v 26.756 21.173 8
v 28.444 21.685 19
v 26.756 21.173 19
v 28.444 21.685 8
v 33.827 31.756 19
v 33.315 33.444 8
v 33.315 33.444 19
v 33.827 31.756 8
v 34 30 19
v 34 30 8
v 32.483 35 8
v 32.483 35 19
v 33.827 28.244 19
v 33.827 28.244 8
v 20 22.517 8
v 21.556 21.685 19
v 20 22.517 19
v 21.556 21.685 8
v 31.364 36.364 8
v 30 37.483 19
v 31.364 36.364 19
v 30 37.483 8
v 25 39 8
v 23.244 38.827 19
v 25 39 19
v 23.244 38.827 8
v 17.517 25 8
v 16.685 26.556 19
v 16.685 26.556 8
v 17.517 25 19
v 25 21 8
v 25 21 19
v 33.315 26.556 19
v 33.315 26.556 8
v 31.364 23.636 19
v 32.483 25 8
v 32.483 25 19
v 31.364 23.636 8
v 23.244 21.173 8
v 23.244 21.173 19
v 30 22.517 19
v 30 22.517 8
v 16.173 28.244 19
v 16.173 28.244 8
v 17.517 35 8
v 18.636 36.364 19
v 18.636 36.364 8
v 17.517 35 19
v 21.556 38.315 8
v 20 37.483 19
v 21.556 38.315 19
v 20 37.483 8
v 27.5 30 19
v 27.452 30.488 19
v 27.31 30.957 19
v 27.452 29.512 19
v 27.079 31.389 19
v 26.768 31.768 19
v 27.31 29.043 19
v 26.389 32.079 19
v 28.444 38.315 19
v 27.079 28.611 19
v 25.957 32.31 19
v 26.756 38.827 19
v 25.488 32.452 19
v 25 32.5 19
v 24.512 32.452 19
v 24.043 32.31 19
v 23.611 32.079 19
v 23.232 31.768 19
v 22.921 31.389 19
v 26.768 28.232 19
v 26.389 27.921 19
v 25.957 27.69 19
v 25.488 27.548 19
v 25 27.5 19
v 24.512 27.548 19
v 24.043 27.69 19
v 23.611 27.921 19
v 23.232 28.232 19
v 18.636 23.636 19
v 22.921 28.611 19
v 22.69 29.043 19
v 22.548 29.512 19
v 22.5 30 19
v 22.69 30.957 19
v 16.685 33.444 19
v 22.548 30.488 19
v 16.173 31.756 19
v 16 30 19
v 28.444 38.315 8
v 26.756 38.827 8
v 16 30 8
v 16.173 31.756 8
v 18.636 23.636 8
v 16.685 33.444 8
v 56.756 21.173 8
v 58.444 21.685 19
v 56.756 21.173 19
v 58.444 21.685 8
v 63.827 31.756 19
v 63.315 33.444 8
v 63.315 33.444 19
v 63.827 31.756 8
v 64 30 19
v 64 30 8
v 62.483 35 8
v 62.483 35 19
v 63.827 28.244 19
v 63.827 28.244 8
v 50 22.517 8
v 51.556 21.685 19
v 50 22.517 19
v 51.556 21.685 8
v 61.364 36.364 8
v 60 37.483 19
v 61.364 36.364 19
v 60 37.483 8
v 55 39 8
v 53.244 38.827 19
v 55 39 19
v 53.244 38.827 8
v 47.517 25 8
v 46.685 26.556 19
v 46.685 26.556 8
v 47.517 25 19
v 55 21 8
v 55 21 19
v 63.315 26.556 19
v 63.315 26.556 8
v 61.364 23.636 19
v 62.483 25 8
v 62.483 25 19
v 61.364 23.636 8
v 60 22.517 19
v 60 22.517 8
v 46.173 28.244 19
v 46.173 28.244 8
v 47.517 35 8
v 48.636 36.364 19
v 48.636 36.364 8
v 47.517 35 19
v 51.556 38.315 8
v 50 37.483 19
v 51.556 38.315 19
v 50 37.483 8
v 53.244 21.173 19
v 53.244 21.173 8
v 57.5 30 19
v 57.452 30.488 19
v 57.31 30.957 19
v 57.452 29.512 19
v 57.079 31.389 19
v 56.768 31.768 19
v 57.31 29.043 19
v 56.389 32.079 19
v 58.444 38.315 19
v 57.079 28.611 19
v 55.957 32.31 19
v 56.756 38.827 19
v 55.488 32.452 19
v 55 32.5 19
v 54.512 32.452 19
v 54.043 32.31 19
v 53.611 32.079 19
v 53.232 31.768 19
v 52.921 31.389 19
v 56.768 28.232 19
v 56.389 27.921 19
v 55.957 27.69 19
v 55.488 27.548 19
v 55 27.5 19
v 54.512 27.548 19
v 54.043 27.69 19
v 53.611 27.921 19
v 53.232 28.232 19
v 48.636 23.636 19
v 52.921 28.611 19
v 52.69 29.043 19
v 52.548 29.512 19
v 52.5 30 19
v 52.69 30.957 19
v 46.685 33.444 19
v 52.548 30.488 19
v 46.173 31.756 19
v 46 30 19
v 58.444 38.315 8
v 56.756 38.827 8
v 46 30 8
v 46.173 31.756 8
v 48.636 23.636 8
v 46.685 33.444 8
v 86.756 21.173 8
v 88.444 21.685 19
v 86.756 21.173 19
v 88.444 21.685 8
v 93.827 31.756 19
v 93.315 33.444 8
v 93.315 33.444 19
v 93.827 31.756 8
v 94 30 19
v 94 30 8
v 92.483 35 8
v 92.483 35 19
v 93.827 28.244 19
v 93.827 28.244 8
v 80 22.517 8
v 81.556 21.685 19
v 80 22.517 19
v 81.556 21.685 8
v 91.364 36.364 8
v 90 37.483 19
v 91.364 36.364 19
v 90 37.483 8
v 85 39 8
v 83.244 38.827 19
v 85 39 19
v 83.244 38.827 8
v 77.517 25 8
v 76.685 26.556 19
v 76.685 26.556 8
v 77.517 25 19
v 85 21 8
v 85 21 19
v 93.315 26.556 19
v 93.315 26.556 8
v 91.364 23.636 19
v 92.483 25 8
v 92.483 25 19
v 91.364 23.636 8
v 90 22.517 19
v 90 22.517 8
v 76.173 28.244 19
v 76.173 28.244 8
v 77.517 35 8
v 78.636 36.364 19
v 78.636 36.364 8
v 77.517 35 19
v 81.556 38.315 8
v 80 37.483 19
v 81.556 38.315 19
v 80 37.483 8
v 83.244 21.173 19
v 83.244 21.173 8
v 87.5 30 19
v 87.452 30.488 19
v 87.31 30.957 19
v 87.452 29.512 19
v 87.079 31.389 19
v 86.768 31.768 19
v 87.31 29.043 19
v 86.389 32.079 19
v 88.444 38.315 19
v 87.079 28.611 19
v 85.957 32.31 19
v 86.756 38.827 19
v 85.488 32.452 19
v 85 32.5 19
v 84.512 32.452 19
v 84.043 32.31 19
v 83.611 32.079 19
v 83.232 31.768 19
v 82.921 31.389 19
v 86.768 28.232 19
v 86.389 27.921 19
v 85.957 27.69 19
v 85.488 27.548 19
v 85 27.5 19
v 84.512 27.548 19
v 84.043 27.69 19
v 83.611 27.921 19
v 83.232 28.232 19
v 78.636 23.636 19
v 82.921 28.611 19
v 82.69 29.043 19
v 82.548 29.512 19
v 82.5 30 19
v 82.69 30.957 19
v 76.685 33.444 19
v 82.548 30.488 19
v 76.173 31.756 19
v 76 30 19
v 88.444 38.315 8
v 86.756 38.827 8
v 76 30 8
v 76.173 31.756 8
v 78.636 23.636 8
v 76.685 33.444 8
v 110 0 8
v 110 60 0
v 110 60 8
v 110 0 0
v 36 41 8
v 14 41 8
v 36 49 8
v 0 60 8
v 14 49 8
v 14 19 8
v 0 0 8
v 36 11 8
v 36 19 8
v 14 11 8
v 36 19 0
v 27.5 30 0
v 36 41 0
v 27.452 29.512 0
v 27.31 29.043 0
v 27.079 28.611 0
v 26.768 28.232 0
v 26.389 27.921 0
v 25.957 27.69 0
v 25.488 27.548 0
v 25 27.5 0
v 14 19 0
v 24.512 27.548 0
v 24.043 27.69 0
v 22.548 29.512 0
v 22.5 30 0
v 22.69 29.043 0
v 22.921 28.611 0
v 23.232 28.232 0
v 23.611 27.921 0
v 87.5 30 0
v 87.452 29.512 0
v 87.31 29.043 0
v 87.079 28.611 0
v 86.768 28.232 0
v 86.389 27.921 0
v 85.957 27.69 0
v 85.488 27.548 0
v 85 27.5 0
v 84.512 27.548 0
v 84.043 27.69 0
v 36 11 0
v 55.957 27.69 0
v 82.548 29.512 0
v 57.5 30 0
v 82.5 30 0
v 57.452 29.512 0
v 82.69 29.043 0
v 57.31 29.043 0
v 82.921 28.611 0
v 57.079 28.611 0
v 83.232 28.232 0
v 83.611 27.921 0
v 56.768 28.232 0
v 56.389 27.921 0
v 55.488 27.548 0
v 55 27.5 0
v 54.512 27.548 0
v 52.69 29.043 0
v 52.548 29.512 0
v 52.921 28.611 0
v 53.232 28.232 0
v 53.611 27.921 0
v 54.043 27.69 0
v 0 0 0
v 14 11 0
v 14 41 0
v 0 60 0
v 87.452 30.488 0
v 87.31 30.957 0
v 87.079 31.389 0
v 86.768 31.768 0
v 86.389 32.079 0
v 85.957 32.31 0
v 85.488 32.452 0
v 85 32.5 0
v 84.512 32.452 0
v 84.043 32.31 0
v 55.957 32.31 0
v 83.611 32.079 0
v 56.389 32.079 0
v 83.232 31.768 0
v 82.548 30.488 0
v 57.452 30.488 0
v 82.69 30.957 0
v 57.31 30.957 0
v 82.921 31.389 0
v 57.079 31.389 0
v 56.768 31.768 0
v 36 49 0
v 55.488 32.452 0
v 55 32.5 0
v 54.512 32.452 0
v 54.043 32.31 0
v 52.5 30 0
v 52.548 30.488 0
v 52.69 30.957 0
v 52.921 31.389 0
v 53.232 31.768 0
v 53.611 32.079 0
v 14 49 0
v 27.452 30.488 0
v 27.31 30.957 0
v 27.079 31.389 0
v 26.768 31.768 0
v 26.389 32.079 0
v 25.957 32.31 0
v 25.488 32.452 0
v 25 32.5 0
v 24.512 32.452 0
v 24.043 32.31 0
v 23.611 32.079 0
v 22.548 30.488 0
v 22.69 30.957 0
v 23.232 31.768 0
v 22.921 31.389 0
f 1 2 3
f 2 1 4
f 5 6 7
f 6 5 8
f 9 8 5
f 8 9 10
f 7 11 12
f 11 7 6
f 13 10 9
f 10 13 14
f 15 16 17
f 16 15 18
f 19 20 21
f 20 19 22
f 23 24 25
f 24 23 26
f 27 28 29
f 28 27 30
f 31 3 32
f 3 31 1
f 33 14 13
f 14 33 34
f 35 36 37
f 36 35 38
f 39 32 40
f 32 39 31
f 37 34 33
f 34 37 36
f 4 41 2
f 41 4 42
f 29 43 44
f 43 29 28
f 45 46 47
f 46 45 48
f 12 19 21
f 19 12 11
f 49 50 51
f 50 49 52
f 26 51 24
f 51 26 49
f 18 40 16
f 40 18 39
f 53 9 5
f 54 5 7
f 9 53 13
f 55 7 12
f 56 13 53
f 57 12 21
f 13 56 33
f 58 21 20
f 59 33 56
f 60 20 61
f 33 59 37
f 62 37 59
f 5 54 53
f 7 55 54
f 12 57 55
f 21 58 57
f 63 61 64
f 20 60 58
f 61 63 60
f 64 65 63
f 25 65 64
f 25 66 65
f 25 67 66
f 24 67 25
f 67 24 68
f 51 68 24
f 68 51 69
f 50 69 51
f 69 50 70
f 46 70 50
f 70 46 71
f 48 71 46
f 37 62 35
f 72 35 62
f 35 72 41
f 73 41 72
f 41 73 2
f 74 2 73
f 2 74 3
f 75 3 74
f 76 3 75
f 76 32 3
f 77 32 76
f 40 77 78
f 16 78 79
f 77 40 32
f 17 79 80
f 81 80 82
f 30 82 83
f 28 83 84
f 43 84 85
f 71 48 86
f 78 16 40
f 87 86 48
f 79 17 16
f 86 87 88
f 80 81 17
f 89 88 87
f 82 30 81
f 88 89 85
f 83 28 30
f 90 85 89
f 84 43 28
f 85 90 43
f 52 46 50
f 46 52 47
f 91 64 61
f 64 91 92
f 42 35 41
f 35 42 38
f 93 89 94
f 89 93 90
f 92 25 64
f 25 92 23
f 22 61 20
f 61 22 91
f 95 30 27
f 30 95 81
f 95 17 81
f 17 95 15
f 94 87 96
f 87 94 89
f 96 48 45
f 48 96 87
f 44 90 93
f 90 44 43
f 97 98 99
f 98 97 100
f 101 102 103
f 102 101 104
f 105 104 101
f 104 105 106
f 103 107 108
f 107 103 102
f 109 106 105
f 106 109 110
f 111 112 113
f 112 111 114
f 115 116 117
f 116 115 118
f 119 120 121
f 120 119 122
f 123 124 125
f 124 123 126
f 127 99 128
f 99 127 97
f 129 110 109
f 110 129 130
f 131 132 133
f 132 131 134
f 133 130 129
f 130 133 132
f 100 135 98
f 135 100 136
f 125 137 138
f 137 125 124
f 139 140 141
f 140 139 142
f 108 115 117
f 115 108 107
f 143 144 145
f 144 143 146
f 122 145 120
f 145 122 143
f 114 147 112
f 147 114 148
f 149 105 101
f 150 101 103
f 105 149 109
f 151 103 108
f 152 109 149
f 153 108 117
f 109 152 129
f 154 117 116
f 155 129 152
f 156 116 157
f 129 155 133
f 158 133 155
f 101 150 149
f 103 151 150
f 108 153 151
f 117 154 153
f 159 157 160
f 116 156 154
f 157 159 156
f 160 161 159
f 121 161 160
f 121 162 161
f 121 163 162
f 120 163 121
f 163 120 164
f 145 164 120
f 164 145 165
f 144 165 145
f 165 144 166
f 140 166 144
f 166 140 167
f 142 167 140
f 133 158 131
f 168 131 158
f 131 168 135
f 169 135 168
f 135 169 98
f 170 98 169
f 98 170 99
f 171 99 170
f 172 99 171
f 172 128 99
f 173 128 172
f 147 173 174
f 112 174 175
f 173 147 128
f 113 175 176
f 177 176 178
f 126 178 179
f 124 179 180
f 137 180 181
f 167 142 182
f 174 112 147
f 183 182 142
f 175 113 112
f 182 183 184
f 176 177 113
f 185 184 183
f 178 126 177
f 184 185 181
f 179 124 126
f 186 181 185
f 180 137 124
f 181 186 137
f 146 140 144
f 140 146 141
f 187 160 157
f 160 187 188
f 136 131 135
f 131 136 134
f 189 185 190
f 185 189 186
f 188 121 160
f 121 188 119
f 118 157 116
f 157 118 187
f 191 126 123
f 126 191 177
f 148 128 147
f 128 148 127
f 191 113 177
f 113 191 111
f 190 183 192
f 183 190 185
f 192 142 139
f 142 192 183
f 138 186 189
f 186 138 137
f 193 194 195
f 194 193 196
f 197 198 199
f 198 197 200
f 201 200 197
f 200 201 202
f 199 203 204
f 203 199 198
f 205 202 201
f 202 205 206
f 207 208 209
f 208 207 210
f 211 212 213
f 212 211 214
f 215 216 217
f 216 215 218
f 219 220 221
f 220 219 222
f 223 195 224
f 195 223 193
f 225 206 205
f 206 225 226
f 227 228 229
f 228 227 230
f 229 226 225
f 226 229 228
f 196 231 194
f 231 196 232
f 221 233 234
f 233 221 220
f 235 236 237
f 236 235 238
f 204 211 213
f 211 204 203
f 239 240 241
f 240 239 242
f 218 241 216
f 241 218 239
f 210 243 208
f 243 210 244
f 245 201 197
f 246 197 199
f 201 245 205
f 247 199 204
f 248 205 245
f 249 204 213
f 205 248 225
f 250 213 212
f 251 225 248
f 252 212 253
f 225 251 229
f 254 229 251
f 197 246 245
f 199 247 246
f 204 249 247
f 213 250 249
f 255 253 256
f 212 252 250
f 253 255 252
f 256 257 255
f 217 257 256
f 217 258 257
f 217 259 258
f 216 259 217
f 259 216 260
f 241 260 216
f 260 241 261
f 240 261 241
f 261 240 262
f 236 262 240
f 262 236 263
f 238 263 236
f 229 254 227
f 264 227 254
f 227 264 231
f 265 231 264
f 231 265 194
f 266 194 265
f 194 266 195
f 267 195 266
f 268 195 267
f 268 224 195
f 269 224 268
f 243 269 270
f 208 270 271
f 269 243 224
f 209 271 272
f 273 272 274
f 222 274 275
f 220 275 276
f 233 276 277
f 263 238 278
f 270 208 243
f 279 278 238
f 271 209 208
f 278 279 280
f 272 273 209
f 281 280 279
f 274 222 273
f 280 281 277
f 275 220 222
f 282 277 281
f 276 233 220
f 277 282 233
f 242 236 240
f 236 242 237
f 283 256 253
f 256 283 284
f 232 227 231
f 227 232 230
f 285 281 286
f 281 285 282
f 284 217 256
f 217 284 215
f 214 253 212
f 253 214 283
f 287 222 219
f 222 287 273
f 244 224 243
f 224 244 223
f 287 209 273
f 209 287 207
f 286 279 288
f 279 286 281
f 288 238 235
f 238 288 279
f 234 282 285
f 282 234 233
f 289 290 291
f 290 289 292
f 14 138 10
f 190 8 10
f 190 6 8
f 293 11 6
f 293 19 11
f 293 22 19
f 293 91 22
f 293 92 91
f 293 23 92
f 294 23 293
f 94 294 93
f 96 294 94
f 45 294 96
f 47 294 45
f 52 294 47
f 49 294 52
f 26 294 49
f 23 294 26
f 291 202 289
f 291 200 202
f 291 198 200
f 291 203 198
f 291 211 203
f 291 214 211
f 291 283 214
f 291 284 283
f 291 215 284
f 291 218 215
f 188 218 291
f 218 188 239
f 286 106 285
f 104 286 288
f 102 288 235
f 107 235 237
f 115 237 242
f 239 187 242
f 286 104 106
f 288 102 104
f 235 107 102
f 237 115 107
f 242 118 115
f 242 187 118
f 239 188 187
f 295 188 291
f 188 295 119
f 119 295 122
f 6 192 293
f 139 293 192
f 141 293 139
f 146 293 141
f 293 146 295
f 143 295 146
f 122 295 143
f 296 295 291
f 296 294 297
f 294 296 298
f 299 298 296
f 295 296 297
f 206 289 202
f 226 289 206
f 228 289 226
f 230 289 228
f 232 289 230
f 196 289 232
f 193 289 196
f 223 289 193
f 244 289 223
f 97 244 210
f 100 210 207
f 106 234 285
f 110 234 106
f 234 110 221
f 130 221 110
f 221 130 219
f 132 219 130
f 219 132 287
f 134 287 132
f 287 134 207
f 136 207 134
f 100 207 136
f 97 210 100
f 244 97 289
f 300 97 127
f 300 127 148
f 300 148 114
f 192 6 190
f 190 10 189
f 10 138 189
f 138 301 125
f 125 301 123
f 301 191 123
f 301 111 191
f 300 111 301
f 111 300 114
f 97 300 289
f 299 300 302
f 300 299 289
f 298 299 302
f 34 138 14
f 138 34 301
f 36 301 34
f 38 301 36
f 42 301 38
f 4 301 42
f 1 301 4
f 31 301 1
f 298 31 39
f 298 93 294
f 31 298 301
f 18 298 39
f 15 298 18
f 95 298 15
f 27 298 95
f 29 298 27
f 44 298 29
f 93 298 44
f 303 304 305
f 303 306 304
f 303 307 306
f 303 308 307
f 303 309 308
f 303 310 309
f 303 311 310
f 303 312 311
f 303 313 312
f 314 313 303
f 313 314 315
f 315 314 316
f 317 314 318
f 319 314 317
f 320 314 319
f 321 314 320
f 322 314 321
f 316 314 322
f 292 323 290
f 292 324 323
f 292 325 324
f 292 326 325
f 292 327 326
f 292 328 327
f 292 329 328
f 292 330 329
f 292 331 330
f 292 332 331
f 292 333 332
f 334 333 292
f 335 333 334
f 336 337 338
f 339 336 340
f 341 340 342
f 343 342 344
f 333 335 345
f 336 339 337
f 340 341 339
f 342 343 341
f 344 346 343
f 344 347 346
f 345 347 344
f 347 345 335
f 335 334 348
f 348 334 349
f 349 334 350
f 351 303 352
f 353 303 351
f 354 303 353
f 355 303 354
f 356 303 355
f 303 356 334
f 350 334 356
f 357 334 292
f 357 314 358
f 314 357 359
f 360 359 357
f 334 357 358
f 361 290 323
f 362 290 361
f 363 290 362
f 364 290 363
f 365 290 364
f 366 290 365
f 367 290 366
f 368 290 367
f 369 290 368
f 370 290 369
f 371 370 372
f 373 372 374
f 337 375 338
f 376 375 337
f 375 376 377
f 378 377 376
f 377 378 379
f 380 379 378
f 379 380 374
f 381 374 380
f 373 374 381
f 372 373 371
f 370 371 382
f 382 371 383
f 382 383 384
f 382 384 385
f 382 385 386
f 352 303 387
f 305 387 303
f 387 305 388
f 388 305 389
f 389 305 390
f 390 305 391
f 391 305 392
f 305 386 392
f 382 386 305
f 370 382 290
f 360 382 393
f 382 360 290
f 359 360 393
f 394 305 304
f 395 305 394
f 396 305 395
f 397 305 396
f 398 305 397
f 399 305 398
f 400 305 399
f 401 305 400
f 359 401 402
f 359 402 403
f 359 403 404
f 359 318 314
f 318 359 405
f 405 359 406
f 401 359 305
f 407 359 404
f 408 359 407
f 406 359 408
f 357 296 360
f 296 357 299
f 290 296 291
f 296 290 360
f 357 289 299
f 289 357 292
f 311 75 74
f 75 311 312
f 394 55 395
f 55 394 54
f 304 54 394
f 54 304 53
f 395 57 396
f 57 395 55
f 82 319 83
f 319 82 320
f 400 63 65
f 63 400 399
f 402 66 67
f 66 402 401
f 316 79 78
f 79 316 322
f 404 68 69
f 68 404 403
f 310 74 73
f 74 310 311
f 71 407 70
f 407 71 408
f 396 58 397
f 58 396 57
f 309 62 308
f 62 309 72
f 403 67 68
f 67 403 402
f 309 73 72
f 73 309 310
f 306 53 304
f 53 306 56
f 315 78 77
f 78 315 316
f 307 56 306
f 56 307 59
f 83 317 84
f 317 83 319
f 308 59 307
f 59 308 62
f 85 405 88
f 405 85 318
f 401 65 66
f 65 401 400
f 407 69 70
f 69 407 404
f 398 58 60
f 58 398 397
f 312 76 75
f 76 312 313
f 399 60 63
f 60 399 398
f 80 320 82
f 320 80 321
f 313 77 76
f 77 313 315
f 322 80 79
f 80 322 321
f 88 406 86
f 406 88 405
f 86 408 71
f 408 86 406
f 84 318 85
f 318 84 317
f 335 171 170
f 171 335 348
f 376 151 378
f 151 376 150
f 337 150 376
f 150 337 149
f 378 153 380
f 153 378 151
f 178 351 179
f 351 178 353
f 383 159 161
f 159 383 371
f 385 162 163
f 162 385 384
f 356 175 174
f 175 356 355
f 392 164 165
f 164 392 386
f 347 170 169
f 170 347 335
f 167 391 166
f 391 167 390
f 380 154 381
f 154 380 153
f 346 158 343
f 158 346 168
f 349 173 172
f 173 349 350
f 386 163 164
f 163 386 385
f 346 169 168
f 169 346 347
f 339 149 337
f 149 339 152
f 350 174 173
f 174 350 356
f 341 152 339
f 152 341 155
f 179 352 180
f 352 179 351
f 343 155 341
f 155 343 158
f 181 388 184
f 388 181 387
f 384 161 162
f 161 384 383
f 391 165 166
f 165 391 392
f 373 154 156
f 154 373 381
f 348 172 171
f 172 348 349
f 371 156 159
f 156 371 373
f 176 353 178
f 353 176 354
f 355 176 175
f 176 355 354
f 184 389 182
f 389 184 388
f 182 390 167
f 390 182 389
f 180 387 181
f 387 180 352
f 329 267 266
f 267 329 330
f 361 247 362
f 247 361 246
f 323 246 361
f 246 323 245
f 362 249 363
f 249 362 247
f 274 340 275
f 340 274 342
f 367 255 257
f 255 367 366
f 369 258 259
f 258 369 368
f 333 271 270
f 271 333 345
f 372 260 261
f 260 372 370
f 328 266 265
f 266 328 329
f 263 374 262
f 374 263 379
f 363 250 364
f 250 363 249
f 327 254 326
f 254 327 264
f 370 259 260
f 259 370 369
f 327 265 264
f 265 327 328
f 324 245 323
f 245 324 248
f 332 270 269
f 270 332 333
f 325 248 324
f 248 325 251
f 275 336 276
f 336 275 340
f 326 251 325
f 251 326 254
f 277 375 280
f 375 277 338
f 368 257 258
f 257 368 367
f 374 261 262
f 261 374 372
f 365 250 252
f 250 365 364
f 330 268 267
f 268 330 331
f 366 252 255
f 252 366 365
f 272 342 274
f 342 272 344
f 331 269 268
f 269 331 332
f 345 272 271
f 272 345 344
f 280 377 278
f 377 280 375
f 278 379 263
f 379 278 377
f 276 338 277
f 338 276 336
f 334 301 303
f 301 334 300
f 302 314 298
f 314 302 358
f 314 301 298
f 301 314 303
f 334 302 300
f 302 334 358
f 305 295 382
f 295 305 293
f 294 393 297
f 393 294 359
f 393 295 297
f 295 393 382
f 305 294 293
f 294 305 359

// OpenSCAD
$fn = 32;

// ----------------------------------------------------------------------
// Drill jig: three_boss_slot jig
// ----------------------------------------------------------------------

// --- parameters (mm) ---
plate_l = 110;            // plate length, X
plate_w = 60;             // plate width, Y
plate_t = 8;              // plate thickness
boss_d = 18;              // guide boss diameter
boss_h = 12;              // boss height above the plate
guide_d = 5;              // guide hole diameter
boss_pitch = 30;          // boss pitch
slot_w = 8;               // clamp slot width
slot_l = 22;              // clamp slot length
slot_x = 14;              // slot start X

n_boss = 3;  // guide bosses
boss_x0 = (plate_l - (n_boss - 1) * boss_pitch) / 2;  // first boss X
boss_top = plate_t - 1 + boss_h;  // boss crown height
total_h = boss_top;  // overall height

difference() {
  union() {
  cube([plate_l, plate_w, plate_t]);
  for (i = [0 : n_boss - 1])
    translate([boss_x0 + i * boss_pitch, plate_w / 2, plate_t - 1])
      cylinder(h = boss_h, d = boss_d);
  }
  for (i = [0 : n_boss - 1])
    translate([boss_x0 + i * boss_pitch, plate_w / 2, -1])
      cylinder(h = plate_t + boss_h, d = guide_d);
  for (cy = [plate_w * 0.25, plate_w * 0.75])
    translate([slot_x, cy - slot_w / 2, -1])
      cube([slot_l, slot_w, plate_t + 2]);
}
